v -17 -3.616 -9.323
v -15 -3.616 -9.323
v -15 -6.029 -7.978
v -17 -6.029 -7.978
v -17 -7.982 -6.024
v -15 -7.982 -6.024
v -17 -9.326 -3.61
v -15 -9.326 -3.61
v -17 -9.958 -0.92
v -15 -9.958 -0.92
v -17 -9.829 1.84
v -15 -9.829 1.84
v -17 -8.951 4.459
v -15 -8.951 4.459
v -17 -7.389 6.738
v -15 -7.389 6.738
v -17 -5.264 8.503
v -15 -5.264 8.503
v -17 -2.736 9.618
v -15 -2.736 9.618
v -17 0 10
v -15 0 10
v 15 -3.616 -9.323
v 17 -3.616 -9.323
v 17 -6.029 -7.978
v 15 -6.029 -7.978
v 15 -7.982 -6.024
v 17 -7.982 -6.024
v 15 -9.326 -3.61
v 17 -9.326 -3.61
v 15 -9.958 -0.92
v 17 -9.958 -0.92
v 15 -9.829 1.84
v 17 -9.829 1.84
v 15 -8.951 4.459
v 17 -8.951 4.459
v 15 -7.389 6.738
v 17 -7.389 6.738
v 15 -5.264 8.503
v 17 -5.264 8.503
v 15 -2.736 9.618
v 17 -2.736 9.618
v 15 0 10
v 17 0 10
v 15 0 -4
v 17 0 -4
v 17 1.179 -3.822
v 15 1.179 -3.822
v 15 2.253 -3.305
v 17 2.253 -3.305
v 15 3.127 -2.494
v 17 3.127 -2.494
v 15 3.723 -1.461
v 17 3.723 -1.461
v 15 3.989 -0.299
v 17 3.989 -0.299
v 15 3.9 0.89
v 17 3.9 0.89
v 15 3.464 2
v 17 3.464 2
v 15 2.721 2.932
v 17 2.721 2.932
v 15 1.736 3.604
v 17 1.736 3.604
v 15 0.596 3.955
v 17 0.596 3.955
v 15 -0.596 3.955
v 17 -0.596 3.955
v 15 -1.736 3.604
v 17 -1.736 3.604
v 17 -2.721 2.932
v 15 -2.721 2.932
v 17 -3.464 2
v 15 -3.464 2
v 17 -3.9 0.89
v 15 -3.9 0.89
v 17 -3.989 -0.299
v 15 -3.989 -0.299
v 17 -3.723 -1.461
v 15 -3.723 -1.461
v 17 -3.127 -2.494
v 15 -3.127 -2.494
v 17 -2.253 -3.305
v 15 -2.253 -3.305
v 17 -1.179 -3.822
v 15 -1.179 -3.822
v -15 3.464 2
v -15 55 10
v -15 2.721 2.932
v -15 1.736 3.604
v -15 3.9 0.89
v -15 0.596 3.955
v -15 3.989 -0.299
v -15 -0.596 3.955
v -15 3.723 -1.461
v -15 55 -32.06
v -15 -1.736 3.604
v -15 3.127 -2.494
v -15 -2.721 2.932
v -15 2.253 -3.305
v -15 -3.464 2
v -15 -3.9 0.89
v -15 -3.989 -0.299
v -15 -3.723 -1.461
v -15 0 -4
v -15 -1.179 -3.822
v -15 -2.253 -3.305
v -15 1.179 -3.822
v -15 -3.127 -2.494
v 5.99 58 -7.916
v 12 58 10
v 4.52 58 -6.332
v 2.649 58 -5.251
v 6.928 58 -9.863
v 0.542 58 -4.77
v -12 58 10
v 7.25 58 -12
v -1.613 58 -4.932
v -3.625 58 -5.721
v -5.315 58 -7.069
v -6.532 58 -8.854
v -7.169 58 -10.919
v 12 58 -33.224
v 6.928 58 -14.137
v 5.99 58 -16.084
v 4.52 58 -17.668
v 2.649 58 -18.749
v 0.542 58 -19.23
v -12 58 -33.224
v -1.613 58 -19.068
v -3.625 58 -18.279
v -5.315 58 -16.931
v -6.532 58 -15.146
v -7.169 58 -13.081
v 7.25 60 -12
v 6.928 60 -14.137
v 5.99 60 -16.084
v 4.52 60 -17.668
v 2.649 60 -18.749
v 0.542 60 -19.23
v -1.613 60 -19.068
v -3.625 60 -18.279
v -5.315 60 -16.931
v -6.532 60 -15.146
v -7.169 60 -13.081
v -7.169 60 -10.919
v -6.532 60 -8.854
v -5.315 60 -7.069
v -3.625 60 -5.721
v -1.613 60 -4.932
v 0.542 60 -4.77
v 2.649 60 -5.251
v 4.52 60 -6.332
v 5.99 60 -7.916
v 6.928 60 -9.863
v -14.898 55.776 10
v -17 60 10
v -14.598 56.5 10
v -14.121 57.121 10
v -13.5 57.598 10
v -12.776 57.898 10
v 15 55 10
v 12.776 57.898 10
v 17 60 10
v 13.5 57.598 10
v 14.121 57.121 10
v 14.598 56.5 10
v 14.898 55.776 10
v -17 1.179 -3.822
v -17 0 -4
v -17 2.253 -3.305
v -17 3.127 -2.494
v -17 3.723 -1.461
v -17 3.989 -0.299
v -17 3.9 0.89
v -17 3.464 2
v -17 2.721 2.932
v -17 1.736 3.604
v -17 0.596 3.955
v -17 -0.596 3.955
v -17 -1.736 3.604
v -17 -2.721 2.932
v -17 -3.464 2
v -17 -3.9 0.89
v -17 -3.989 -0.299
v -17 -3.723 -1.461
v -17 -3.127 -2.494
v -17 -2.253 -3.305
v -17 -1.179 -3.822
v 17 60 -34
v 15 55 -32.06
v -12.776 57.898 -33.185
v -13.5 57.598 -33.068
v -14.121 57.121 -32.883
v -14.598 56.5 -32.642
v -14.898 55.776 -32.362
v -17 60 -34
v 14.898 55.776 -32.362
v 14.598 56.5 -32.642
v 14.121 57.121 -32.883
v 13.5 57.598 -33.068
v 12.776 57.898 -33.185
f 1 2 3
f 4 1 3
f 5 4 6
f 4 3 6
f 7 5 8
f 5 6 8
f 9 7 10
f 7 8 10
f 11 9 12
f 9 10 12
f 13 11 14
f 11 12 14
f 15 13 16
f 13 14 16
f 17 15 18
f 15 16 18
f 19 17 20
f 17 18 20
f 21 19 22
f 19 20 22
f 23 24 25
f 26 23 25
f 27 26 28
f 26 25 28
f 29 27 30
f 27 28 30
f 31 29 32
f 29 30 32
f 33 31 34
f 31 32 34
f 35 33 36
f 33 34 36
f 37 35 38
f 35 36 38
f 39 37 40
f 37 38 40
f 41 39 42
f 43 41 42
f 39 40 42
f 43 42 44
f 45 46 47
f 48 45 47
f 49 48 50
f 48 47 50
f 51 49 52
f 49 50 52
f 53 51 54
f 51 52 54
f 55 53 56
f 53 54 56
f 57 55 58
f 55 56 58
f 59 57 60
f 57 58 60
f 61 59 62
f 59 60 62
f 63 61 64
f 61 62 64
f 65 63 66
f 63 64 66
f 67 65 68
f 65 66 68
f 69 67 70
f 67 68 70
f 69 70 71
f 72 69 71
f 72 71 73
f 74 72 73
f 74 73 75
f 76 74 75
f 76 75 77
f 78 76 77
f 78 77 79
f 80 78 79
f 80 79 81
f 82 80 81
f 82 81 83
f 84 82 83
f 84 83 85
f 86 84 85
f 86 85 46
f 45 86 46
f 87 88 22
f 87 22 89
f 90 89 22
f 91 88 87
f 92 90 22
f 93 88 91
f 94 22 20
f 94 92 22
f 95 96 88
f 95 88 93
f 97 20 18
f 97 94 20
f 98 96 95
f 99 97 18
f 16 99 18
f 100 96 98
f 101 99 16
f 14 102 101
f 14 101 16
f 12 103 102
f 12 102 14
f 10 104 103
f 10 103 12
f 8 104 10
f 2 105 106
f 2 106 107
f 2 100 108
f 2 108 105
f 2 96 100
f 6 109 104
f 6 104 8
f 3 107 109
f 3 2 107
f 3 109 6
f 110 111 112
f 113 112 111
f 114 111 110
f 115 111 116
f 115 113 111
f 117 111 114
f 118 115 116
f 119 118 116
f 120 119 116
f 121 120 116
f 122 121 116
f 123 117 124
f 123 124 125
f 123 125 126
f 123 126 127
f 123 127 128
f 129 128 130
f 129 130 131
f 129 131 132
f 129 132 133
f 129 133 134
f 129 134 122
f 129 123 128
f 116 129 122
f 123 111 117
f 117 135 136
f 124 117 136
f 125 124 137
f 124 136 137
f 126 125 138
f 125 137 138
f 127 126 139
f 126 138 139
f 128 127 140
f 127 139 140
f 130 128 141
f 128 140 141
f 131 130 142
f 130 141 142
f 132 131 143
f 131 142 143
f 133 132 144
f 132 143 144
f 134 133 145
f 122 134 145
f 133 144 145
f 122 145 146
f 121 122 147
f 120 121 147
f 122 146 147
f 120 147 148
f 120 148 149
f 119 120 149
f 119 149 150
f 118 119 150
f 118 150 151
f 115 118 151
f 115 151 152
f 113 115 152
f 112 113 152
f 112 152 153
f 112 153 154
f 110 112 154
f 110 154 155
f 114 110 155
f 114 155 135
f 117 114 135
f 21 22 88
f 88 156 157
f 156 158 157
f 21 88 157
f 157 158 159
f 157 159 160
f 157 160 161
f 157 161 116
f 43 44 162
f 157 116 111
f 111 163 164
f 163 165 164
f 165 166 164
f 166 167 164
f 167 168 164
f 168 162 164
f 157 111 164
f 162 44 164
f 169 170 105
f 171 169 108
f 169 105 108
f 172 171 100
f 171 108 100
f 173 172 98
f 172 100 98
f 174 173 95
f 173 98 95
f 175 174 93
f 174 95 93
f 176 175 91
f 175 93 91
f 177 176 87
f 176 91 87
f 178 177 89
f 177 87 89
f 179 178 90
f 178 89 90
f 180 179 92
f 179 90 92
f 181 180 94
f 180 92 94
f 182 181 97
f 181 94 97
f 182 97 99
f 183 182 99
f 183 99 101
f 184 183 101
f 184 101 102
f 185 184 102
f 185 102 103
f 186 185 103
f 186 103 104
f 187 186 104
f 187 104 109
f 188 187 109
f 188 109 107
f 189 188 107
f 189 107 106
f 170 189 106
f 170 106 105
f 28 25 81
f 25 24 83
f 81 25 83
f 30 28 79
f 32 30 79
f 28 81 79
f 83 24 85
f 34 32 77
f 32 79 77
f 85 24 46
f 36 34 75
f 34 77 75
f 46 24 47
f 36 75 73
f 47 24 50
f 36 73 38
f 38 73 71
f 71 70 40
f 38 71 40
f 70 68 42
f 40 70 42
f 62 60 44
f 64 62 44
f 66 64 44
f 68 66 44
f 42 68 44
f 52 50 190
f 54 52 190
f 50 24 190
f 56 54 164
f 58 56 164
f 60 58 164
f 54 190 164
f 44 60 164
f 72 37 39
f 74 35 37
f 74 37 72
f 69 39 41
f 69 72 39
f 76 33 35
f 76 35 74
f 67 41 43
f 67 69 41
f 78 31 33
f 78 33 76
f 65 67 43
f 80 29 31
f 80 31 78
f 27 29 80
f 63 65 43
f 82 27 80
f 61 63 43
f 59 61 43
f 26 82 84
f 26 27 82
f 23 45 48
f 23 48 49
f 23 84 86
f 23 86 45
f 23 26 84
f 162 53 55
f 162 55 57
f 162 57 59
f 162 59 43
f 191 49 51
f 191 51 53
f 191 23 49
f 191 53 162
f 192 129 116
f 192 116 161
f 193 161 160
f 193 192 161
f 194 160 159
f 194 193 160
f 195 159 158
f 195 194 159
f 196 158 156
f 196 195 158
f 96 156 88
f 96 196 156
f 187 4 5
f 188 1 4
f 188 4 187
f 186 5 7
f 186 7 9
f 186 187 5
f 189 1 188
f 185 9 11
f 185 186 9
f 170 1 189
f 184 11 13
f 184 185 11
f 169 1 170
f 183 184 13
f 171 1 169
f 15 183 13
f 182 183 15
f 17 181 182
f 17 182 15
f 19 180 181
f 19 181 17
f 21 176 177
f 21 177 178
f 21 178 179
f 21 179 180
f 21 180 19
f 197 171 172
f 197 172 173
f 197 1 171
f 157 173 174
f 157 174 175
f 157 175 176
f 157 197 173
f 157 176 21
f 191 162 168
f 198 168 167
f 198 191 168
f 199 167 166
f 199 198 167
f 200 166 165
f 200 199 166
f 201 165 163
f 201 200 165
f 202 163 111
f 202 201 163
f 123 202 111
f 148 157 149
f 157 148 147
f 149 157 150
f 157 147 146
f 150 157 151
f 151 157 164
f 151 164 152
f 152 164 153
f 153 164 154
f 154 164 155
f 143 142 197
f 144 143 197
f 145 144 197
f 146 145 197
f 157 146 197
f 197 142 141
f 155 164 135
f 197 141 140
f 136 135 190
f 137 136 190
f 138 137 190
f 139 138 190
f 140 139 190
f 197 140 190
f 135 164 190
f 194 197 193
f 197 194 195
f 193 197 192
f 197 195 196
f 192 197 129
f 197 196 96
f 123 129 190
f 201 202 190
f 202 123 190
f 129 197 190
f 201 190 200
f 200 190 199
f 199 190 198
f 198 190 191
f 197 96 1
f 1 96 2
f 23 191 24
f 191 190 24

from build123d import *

# Parameters (mm, degrees)
CROQUIS1_R                        = 4
SALIENTE_EXTRUIR1_DEPTH           = 34
CORTAR_EXTRUIR1_REACH             = 36
CORTAR_EXTRUIR1_DIRECTION_2_REACH = 12
CORTAR_EXTRUIR2_REACH             = 72
CROQUIS4_R                        = 7.25


with BuildPart() as part:
    # Croquis1 → Saliente-Extruir1 (new body)
    with BuildSketch(Plane(origin=(17, 0, 0), x_dir=(0, 0, -1), z_dir=(1, 0, 0))):
        with BuildLine():
            Line((-10, 0), (-10, 60))
            Line((-10, 60), (34, 60))
            Line((34, 60), (9.323156657, -3.616455439))
            ThreePointArc((9.323156657, -3.616455439), (-1.839624069, -9.8293328), (-10, 0))
        make_face()
        Circle(CROQUIS1_R, mode=Mode.SUBTRACT)
    extrude(amount=-SALIENTE_EXTRUIR1_DEPTH)

    # Croquis3 → Cortar-Extruir1 (cut, up to next)
    with BuildSketch(Plane.XY, mode=Mode.PRIVATE) as cortar_extruir1_sk1:
        with BuildLine():
            Line((-15, -10), (15, -10))
            Line((15, -10), (15, 55))
            ThreePointArc((15, 55), (14.121320344, 57.121320344), (12, 58))
            Line((12, 58), (-12, 58))
            ThreePointArc((-12, 58), (-14.121320344, 57.121320344), (-15, 55))
            Line((-15, 55), (-15, -10))
        make_face()
    cortar_extruir1_tool1 = extrude(cortar_extruir1_sk1.sketch, amount=-CORTAR_EXTRUIR1_REACH, mode=Mode.PRIVATE) & part.part
    add(cortar_extruir1_tool1.solids().sort_by_distance((0, 23.936769, 0))[0], mode=Mode.SUBTRACT)

    # Croquis3 → Cortar-Extruir1 direction 2 (cut, up to next)
    with BuildSketch(Plane.XY, mode=Mode.PRIVATE) as cortar_extruir1_direction_2_sk1:
        with BuildLine():
            Line((-15, -10), (15, -10))
            Line((15, -10), (15, 55))
            ThreePointArc((15, 55), (14.121320344, 57.121320344), (12, 58))
            Line((12, 58), (-12, 58))
            ThreePointArc((-12, 58), (-14.121320344, 57.121320344), (-15, 55))
            Line((-15, 55), (-15, -10))
        make_face()
    cortar_extruir1_direction_2_tool1 = extrude(cortar_extruir1_direction_2_sk1.sketch, amount=CORTAR_EXTRUIR1_DIRECTION_2_REACH, mode=Mode.PRIVATE) & part.part
    add(cortar_extruir1_direction_2_tool1.solids().sort_by_distance((0, 23.936769, 0))[0], mode=Mode.SUBTRACT)

    # Croquis4 → Cortar-Extruir2 (cut, up to next)
    with BuildSketch(Plane(origin=(0, 60, 0), x_dir=(1, 0, 0), z_dir=(0, 1, 0)), mode=Mode.PRIVATE) as cortar_extruir2_sk1:
        with Locations((0, 12)):
            Circle(CROQUIS4_R)
    cortar_extruir2_tool1 = extrude(cortar_extruir2_sk1.sketch, amount=-CORTAR_EXTRUIR2_REACH, mode=Mode.PRIVATE) & part.part
    add(cortar_extruir2_tool1.solids().sort_by_distance((0, 60, -12))[0], mode=Mode.SUBTRACT)


solid = part.part
